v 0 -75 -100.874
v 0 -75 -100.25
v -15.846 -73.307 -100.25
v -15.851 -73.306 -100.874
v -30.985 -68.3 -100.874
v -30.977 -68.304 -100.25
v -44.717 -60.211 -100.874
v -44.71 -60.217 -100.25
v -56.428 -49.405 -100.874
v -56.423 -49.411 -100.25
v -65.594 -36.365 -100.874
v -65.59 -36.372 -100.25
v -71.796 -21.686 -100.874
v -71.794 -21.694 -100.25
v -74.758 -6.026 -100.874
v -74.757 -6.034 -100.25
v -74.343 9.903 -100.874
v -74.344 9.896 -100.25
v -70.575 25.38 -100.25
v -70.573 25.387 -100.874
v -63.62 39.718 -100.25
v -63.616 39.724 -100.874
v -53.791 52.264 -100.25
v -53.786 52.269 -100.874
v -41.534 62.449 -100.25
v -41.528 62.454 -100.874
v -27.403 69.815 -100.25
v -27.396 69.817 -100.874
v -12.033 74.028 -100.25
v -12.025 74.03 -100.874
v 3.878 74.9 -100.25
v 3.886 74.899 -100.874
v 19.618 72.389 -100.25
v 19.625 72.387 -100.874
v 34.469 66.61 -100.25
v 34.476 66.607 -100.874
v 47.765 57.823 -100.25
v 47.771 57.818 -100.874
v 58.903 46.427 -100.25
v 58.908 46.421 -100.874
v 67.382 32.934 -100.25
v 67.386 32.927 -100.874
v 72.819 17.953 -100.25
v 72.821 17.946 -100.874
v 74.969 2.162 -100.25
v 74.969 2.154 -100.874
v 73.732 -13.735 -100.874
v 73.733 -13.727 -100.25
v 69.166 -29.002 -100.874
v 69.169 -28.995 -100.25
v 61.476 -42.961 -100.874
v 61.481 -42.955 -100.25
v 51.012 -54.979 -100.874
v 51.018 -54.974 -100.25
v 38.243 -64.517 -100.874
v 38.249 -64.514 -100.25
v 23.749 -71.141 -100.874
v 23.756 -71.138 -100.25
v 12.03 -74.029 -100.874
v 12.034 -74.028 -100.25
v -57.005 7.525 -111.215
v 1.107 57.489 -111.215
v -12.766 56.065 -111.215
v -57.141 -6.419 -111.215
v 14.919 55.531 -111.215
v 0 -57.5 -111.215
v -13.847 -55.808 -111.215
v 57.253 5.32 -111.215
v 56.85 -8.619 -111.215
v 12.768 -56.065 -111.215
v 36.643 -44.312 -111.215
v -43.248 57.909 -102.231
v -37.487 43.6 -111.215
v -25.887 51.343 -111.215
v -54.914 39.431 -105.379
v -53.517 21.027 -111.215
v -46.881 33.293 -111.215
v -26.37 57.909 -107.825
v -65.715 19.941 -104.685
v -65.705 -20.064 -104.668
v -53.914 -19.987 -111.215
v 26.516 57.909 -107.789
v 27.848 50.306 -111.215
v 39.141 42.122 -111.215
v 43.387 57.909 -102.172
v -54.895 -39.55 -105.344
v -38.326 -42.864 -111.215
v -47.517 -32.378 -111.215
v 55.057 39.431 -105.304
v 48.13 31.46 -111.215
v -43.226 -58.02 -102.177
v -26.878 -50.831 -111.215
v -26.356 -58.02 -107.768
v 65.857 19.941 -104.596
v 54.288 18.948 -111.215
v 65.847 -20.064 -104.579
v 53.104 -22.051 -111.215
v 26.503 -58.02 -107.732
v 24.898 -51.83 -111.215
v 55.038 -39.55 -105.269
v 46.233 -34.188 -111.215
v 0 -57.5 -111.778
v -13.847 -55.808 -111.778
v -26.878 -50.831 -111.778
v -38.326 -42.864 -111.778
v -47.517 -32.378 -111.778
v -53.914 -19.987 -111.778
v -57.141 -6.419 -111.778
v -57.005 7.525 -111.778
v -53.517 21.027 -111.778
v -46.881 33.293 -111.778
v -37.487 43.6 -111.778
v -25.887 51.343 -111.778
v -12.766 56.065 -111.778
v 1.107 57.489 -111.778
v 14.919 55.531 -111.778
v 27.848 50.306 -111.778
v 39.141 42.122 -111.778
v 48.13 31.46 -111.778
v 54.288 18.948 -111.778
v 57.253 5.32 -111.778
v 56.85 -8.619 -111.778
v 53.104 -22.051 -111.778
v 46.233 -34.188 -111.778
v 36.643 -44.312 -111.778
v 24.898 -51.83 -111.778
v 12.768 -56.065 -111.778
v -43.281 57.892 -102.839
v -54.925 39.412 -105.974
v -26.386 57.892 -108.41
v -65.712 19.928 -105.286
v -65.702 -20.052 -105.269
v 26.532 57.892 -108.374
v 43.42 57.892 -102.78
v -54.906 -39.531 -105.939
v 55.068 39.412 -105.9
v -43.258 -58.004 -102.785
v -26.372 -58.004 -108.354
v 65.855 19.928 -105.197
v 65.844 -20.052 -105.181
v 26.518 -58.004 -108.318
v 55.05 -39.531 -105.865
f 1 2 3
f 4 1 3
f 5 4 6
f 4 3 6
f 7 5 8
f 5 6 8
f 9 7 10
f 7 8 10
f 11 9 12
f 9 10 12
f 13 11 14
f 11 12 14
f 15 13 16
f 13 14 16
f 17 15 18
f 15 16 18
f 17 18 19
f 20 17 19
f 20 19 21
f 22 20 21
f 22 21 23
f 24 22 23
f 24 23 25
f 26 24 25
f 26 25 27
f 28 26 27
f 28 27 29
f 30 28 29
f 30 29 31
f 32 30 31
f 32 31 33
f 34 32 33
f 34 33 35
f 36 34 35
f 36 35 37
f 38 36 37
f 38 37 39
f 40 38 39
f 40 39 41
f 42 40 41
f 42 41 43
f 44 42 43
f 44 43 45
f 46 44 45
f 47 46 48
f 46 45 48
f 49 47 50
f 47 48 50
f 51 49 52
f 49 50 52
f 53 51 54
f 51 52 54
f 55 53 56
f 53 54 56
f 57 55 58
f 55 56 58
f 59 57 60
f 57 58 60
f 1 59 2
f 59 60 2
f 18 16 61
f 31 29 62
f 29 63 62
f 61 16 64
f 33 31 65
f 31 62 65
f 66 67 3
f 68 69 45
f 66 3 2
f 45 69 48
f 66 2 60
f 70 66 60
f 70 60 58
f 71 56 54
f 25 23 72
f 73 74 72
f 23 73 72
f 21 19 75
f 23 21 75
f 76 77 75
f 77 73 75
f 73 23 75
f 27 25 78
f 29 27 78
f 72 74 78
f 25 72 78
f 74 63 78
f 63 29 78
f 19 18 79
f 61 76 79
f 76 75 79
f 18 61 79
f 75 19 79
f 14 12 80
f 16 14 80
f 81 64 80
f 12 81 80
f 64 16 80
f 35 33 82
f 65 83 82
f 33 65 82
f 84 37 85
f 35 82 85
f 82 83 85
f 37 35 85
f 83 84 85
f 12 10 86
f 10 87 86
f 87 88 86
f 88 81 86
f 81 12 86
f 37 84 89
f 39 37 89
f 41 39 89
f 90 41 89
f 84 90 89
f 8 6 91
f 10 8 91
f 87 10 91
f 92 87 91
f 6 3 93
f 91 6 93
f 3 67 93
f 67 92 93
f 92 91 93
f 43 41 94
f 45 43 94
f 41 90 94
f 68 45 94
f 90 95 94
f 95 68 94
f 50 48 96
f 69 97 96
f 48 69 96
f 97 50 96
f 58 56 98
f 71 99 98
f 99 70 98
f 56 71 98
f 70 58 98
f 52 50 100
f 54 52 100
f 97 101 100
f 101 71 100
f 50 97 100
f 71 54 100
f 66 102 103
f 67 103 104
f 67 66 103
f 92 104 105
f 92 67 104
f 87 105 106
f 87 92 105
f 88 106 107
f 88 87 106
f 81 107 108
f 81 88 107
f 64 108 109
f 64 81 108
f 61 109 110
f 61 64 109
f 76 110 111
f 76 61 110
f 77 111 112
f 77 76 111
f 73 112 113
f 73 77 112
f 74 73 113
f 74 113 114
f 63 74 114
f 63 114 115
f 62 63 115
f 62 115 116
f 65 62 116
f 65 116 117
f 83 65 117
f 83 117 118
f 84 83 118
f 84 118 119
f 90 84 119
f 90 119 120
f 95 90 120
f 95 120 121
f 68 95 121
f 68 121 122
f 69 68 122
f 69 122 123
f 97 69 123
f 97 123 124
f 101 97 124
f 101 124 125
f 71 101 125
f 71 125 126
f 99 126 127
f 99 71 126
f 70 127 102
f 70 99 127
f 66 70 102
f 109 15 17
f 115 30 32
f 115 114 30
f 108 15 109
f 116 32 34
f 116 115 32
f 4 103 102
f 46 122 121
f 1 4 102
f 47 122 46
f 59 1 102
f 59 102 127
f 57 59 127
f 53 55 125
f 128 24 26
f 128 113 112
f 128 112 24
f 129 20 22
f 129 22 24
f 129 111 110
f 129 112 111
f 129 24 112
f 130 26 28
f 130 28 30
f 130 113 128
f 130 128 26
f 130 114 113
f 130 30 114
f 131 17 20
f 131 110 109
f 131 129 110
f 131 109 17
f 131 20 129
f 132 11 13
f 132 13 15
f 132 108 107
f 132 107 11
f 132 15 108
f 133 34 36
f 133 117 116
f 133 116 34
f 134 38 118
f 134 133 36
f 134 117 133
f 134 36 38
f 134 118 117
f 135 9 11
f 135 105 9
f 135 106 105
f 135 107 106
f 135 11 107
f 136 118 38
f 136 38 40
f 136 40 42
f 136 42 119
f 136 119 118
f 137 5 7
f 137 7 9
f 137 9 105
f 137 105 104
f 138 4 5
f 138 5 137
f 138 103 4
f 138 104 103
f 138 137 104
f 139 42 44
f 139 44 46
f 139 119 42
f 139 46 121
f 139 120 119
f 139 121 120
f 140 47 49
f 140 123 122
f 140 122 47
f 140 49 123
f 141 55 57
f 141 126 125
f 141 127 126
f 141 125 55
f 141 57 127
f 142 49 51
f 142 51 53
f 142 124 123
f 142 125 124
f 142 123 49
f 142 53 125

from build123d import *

# Parameters (mm, degrees)
REVOLVE_1_ANGLE      = 180
SHELL_1_T            = 0.5
SKETCH_2_OUTSIDE_W   = 328.82
SKETCH_2_OUTSIDE_H   = 328.82
SKETCH_2_OUTSIDE_R   = 75
SKETCH_2_OUTSIDE_R_2 = 57.5
CUT_EXTRUDE_1_DEPTH  = 323


with BuildPart() as part:
    # 草图1 → 旋转1 (revolve)
    with BuildSketch(Plane.XY):
        with BuildLine():
            Line((0, -125.2), (0, 125.2))
            ThreePointArc((0, 125.2), (-125.2, 0), (0, -125.2))
        make_face()
    revolve(axis=Axis((0, 175.755690027, 0), (0, -1, 0)), revolution_arc=REVOLVE_1_ANGLE)

    # 抽壳1
    shell_1_openings = [part.faces().sort_by_distance(p)[0] for p in [
        (0, 0, 0),
    ]]
    offset(amount=SHELL_1_T, openings=shell_1_openings)

    # 草图2 outside → 切除-拉伸1 (cut)
    with BuildSketch(Plane(origin=(0, 0, 0), x_dir=(1, 0, 0), z_dir=(0, 0, -1))):
        Rectangle(SKETCH_2_OUTSIDE_W, SKETCH_2_OUTSIDE_H)
        with Locations(Location((0, 0, 0), (0, 0, 90))):
            Circle(SKETCH_2_OUTSIDE_R, mode=Mode.SUBTRACT)
        with Locations(Location((0, 0, 0), (0, 0, 90))):
            Circle(SKETCH_2_OUTSIDE_R_2)
    extrude(amount=CUT_EXTRUDE_1_DEPTH, mode=Mode.SUBTRACT)


solid = part.part
